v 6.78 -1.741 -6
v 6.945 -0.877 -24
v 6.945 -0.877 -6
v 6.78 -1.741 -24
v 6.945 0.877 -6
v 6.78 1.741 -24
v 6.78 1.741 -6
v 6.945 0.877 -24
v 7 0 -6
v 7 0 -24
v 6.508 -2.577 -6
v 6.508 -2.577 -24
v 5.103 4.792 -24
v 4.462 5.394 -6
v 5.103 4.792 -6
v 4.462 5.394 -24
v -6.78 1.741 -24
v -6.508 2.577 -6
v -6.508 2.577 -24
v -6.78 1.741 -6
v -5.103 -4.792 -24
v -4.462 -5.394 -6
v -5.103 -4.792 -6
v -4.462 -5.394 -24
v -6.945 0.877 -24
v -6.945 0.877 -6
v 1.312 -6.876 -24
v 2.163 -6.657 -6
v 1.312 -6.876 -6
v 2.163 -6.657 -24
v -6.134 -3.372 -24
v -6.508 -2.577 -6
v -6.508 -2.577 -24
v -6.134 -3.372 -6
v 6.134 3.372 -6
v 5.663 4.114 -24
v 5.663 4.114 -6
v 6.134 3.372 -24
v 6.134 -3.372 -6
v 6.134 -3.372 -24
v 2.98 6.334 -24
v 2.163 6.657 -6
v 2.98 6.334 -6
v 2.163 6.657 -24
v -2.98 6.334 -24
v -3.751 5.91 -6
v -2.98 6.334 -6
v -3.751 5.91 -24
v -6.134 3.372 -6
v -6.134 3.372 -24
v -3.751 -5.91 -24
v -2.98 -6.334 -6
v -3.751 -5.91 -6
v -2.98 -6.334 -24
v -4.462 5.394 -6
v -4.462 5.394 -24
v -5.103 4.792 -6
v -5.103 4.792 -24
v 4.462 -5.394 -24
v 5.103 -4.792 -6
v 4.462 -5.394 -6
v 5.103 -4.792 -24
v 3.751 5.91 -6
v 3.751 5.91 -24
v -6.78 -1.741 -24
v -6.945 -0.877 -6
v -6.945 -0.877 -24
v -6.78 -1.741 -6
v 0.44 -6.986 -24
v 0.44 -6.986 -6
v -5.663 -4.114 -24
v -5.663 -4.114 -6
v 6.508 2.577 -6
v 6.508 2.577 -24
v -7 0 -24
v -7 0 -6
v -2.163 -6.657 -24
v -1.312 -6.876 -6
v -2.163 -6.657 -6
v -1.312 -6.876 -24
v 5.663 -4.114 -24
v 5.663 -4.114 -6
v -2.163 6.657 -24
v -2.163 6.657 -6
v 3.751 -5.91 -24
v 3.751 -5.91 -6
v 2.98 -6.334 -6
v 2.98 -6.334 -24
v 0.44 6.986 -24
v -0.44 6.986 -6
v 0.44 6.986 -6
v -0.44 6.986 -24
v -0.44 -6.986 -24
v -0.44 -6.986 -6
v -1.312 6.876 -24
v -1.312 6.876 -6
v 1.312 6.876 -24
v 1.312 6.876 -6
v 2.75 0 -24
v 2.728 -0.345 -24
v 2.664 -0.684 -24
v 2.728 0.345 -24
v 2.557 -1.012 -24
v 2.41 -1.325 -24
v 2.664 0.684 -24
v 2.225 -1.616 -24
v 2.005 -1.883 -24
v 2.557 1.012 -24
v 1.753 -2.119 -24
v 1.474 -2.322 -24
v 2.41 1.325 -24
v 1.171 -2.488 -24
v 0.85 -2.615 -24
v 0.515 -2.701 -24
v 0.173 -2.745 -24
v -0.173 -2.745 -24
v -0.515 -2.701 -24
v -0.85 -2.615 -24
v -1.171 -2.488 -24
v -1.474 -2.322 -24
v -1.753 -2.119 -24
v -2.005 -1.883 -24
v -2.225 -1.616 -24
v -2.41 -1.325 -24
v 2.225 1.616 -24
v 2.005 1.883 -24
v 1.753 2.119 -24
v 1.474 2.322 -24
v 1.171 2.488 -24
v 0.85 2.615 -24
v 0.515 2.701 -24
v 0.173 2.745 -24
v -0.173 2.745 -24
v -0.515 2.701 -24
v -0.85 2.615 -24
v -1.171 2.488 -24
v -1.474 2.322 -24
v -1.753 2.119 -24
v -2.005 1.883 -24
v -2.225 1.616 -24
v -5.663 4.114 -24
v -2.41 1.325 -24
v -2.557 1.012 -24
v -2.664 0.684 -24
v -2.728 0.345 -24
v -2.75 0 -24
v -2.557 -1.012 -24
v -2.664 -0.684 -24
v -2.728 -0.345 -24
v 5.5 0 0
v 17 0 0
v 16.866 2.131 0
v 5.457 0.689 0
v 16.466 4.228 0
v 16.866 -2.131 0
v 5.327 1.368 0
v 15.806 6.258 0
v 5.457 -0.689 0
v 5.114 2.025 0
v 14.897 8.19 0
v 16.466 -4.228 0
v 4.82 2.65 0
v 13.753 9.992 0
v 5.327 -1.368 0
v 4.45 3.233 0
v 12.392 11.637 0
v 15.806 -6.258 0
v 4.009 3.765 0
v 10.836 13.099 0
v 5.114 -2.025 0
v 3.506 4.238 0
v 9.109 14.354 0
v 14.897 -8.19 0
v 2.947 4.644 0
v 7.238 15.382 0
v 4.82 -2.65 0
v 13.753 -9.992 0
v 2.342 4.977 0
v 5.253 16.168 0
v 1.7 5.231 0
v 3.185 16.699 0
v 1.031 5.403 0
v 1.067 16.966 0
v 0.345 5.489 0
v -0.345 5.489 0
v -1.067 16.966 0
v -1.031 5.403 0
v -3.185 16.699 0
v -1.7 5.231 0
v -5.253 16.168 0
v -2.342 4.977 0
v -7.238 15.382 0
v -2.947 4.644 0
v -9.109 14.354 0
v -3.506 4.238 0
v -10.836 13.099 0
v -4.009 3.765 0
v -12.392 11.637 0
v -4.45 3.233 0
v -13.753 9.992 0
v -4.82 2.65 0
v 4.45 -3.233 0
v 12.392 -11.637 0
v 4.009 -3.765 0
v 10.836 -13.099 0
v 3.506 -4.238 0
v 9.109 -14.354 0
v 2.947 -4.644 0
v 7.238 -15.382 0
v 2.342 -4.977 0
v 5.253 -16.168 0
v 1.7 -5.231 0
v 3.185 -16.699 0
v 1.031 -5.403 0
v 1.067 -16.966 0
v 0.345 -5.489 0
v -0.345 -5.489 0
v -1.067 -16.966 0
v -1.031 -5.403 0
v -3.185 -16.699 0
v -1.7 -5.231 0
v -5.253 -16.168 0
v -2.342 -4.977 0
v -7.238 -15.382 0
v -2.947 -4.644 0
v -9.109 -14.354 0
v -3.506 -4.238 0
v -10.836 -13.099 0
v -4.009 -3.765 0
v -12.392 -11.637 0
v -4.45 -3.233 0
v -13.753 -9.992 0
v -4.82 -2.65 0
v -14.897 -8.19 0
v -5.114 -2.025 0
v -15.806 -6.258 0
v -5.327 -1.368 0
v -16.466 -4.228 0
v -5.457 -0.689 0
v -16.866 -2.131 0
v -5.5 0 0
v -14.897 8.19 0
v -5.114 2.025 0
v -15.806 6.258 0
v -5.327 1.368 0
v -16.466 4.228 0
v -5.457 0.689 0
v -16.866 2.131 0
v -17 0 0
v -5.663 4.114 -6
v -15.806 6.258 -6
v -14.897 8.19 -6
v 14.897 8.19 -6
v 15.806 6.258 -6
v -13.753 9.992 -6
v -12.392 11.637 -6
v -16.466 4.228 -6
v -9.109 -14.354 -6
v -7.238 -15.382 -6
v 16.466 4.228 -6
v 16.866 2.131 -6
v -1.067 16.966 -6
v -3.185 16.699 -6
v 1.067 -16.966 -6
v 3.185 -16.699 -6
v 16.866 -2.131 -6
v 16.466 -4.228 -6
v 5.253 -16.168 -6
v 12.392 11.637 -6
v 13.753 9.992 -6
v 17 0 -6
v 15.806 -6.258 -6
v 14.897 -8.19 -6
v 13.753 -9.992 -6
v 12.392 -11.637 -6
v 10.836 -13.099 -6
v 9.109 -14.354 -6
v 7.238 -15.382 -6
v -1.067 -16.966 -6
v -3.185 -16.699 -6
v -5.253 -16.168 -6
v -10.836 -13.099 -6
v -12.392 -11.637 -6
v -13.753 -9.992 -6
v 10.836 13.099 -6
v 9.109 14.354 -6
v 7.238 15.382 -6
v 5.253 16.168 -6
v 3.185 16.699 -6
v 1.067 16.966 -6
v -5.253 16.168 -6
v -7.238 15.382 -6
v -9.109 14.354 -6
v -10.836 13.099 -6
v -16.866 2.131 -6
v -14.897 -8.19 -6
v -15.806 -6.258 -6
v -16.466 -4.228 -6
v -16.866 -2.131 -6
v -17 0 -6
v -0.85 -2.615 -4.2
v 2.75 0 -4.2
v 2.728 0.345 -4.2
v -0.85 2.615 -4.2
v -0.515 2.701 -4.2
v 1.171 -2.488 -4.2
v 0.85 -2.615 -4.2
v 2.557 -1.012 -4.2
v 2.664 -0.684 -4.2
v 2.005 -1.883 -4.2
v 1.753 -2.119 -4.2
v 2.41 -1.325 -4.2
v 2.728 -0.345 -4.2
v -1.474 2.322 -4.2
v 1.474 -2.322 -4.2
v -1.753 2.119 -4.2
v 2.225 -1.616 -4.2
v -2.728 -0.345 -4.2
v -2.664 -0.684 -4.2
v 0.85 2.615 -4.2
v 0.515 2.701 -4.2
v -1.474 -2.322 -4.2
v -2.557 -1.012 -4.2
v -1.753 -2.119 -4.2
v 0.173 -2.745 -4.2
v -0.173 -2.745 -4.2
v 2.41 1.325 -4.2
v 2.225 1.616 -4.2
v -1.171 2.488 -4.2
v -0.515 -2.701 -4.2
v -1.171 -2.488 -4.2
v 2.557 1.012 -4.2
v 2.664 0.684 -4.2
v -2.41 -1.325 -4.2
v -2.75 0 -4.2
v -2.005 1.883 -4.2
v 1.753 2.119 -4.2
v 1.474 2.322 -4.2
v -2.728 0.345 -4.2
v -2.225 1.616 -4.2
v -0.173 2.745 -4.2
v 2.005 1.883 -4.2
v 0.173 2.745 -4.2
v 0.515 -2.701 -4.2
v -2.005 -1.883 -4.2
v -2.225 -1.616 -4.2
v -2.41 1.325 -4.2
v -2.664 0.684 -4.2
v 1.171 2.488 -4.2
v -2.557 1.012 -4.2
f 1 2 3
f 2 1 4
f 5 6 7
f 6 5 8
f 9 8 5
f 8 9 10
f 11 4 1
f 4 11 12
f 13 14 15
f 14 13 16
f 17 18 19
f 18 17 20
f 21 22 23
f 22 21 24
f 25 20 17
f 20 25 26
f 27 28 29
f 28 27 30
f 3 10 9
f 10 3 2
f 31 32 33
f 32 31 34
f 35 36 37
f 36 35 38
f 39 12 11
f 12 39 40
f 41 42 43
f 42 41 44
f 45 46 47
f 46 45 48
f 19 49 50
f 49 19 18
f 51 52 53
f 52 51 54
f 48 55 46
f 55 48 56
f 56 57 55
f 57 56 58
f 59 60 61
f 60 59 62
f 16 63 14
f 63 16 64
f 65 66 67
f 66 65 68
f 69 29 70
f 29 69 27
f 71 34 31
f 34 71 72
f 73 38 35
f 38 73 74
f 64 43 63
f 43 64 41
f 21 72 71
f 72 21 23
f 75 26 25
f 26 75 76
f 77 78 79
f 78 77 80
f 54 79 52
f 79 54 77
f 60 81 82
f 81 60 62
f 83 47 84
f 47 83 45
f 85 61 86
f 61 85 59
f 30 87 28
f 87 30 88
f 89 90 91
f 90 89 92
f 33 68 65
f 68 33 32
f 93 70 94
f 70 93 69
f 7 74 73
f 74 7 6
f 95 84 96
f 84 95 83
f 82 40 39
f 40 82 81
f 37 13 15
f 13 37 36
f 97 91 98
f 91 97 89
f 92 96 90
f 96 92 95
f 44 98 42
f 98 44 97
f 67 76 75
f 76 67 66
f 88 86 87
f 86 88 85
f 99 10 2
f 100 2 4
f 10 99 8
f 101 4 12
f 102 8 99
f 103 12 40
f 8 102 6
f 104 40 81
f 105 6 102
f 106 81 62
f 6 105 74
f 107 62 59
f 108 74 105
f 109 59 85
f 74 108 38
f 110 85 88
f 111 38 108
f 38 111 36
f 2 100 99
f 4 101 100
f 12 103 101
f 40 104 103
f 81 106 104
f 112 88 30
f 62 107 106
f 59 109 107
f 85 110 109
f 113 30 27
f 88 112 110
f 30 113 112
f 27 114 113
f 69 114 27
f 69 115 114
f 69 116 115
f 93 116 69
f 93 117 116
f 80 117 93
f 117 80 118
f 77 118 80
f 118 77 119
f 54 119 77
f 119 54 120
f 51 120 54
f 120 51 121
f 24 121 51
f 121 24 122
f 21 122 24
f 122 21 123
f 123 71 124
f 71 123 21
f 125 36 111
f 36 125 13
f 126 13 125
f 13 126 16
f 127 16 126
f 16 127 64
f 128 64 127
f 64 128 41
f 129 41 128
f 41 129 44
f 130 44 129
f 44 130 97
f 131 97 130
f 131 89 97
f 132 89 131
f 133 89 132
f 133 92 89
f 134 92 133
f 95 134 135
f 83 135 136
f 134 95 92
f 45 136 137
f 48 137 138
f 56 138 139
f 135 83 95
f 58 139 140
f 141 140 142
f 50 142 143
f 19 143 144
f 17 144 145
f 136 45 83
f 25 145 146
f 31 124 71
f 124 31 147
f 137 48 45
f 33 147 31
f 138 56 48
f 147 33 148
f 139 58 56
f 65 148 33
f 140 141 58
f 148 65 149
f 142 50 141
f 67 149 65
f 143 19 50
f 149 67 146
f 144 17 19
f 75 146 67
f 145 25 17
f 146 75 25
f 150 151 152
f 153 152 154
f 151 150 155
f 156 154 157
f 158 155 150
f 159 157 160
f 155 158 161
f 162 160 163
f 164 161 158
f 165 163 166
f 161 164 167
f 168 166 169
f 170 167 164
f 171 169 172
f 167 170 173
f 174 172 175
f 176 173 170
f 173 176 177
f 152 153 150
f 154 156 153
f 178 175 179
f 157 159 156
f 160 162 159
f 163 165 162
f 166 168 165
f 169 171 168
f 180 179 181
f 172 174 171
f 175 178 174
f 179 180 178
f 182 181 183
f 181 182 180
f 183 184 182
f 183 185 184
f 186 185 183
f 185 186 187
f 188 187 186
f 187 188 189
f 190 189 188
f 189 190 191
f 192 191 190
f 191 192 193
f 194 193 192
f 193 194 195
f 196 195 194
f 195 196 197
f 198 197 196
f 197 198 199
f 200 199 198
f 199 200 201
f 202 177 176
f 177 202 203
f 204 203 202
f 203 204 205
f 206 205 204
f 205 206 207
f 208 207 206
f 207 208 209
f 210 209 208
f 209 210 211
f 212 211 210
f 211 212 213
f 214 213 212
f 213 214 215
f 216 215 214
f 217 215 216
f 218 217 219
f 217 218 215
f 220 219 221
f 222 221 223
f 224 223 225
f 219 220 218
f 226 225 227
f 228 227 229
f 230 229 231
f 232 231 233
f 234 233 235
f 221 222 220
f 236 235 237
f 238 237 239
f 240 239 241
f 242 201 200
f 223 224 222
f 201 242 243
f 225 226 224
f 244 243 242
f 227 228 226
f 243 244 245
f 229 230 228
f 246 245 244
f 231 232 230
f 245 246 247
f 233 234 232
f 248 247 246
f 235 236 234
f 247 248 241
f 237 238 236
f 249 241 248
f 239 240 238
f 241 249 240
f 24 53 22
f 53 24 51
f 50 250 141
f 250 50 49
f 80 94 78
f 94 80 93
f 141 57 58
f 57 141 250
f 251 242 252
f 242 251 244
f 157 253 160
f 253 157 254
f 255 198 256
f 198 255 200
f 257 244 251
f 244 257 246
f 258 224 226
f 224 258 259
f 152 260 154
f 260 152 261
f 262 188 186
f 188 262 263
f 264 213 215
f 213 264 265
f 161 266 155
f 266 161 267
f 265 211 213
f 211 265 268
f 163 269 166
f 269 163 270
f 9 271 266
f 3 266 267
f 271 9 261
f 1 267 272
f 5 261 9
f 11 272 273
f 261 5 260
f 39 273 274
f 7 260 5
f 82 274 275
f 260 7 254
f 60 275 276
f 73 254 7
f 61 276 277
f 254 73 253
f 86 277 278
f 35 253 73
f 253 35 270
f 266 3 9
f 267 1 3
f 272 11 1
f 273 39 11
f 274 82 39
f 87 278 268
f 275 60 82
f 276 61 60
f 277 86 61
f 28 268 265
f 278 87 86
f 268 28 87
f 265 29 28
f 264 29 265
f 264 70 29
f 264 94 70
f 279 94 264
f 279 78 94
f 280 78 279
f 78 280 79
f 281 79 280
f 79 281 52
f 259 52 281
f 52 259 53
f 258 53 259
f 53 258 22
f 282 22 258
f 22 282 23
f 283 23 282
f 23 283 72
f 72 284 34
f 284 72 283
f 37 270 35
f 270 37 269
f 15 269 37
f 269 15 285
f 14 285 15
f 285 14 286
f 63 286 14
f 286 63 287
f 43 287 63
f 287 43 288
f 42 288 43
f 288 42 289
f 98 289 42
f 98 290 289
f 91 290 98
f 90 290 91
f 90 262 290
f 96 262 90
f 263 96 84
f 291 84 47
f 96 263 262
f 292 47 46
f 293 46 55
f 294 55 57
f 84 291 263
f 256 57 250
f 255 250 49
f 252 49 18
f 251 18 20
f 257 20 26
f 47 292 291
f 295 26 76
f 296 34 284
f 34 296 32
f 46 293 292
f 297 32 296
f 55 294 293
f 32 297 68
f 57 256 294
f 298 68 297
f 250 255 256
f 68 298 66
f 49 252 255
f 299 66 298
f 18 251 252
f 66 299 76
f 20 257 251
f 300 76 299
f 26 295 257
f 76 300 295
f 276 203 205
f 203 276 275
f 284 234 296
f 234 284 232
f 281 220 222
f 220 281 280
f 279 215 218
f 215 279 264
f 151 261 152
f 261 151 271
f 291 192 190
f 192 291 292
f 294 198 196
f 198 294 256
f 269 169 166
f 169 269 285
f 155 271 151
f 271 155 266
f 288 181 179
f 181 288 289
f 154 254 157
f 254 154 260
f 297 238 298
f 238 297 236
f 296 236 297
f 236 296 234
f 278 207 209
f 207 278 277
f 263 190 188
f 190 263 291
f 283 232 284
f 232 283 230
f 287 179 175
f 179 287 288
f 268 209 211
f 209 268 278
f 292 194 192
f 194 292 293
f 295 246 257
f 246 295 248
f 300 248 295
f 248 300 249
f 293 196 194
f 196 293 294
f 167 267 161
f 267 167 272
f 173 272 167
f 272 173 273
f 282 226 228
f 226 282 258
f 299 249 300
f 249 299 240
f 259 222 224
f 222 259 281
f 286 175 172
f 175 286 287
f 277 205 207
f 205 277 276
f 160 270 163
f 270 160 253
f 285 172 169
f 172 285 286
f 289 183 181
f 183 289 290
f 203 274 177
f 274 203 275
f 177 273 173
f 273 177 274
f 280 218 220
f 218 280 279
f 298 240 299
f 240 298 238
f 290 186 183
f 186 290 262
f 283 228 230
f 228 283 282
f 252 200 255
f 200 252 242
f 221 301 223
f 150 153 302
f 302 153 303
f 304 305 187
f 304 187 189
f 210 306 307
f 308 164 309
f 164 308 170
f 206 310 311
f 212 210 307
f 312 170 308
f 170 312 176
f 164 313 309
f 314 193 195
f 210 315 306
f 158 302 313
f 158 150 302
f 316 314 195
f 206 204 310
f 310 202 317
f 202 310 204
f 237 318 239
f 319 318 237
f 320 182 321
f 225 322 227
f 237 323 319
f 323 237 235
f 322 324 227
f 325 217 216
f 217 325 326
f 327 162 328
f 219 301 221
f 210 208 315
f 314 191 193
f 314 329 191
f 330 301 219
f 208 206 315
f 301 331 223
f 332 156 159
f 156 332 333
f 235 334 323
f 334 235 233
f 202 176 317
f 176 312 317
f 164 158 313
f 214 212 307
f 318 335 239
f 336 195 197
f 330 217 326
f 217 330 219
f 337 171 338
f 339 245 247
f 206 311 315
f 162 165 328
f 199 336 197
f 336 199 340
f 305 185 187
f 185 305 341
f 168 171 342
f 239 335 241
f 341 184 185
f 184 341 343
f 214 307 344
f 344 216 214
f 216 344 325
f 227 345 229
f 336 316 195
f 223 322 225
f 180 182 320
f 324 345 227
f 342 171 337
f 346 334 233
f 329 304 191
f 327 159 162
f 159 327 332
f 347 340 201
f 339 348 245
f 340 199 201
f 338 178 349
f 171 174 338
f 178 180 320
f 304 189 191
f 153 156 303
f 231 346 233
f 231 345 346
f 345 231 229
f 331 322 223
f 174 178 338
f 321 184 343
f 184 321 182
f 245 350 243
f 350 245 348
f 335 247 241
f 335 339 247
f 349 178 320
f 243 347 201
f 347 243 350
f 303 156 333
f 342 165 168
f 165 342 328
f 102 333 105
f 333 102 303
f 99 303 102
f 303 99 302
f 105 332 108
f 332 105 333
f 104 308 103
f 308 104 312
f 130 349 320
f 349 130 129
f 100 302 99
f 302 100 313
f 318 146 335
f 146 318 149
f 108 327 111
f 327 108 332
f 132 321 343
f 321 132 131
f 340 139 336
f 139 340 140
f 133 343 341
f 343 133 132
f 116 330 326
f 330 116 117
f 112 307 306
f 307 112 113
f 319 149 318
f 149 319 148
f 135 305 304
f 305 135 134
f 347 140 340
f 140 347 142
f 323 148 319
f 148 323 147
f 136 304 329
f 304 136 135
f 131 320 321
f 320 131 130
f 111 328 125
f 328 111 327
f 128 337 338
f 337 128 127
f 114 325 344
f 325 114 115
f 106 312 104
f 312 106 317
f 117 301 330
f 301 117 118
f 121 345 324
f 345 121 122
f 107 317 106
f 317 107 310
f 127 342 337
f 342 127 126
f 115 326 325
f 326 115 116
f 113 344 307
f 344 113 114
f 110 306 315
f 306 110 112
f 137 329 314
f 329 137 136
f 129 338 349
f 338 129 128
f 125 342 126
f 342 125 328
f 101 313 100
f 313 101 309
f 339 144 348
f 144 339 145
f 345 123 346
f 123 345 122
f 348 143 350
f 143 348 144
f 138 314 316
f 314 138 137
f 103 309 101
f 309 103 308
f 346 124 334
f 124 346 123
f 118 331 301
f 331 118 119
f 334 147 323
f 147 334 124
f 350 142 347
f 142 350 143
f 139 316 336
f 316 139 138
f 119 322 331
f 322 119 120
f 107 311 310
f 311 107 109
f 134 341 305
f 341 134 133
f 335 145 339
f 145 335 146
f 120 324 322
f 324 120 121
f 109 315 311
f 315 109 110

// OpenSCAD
$fn = 50;


difference() {
	union() {
		translate(v = [0, 0, -24.0000000000]) {
			cylinder(h = 24, r = 7.0000000000);
		}
		translate(v = [0, 0, -6.0000000000]) {
			cylinder(h = 6, r = 17.0000000000);
		}
	}
	union() {
		translate(v = [0, 0, 0]) {
			rotate(a = [0, 0, 0]) {
				difference() {
					union() {
						#translate(v = [0, 0, -24.0000000000]) {
							cylinder(h = 24, r = 2.2500000000);
						}
						#translate(v = [0, 0, -4.2000000000]) {
							cylinder(h = 4.2000000000, r1 = 2.7500000000, r2 = 5.5000000000);
						}
						#translate(v = [0, 0, -24.0000000000]) {
							cylinder(h = 24, r = 2.7500000000);
						}
						#translate(v = [0, 0, -24.0000000000]) {
							cylinder(h = 24, r = 2.2500000000);
						}
					}
					union();
				}
			}
		}
	}
}
